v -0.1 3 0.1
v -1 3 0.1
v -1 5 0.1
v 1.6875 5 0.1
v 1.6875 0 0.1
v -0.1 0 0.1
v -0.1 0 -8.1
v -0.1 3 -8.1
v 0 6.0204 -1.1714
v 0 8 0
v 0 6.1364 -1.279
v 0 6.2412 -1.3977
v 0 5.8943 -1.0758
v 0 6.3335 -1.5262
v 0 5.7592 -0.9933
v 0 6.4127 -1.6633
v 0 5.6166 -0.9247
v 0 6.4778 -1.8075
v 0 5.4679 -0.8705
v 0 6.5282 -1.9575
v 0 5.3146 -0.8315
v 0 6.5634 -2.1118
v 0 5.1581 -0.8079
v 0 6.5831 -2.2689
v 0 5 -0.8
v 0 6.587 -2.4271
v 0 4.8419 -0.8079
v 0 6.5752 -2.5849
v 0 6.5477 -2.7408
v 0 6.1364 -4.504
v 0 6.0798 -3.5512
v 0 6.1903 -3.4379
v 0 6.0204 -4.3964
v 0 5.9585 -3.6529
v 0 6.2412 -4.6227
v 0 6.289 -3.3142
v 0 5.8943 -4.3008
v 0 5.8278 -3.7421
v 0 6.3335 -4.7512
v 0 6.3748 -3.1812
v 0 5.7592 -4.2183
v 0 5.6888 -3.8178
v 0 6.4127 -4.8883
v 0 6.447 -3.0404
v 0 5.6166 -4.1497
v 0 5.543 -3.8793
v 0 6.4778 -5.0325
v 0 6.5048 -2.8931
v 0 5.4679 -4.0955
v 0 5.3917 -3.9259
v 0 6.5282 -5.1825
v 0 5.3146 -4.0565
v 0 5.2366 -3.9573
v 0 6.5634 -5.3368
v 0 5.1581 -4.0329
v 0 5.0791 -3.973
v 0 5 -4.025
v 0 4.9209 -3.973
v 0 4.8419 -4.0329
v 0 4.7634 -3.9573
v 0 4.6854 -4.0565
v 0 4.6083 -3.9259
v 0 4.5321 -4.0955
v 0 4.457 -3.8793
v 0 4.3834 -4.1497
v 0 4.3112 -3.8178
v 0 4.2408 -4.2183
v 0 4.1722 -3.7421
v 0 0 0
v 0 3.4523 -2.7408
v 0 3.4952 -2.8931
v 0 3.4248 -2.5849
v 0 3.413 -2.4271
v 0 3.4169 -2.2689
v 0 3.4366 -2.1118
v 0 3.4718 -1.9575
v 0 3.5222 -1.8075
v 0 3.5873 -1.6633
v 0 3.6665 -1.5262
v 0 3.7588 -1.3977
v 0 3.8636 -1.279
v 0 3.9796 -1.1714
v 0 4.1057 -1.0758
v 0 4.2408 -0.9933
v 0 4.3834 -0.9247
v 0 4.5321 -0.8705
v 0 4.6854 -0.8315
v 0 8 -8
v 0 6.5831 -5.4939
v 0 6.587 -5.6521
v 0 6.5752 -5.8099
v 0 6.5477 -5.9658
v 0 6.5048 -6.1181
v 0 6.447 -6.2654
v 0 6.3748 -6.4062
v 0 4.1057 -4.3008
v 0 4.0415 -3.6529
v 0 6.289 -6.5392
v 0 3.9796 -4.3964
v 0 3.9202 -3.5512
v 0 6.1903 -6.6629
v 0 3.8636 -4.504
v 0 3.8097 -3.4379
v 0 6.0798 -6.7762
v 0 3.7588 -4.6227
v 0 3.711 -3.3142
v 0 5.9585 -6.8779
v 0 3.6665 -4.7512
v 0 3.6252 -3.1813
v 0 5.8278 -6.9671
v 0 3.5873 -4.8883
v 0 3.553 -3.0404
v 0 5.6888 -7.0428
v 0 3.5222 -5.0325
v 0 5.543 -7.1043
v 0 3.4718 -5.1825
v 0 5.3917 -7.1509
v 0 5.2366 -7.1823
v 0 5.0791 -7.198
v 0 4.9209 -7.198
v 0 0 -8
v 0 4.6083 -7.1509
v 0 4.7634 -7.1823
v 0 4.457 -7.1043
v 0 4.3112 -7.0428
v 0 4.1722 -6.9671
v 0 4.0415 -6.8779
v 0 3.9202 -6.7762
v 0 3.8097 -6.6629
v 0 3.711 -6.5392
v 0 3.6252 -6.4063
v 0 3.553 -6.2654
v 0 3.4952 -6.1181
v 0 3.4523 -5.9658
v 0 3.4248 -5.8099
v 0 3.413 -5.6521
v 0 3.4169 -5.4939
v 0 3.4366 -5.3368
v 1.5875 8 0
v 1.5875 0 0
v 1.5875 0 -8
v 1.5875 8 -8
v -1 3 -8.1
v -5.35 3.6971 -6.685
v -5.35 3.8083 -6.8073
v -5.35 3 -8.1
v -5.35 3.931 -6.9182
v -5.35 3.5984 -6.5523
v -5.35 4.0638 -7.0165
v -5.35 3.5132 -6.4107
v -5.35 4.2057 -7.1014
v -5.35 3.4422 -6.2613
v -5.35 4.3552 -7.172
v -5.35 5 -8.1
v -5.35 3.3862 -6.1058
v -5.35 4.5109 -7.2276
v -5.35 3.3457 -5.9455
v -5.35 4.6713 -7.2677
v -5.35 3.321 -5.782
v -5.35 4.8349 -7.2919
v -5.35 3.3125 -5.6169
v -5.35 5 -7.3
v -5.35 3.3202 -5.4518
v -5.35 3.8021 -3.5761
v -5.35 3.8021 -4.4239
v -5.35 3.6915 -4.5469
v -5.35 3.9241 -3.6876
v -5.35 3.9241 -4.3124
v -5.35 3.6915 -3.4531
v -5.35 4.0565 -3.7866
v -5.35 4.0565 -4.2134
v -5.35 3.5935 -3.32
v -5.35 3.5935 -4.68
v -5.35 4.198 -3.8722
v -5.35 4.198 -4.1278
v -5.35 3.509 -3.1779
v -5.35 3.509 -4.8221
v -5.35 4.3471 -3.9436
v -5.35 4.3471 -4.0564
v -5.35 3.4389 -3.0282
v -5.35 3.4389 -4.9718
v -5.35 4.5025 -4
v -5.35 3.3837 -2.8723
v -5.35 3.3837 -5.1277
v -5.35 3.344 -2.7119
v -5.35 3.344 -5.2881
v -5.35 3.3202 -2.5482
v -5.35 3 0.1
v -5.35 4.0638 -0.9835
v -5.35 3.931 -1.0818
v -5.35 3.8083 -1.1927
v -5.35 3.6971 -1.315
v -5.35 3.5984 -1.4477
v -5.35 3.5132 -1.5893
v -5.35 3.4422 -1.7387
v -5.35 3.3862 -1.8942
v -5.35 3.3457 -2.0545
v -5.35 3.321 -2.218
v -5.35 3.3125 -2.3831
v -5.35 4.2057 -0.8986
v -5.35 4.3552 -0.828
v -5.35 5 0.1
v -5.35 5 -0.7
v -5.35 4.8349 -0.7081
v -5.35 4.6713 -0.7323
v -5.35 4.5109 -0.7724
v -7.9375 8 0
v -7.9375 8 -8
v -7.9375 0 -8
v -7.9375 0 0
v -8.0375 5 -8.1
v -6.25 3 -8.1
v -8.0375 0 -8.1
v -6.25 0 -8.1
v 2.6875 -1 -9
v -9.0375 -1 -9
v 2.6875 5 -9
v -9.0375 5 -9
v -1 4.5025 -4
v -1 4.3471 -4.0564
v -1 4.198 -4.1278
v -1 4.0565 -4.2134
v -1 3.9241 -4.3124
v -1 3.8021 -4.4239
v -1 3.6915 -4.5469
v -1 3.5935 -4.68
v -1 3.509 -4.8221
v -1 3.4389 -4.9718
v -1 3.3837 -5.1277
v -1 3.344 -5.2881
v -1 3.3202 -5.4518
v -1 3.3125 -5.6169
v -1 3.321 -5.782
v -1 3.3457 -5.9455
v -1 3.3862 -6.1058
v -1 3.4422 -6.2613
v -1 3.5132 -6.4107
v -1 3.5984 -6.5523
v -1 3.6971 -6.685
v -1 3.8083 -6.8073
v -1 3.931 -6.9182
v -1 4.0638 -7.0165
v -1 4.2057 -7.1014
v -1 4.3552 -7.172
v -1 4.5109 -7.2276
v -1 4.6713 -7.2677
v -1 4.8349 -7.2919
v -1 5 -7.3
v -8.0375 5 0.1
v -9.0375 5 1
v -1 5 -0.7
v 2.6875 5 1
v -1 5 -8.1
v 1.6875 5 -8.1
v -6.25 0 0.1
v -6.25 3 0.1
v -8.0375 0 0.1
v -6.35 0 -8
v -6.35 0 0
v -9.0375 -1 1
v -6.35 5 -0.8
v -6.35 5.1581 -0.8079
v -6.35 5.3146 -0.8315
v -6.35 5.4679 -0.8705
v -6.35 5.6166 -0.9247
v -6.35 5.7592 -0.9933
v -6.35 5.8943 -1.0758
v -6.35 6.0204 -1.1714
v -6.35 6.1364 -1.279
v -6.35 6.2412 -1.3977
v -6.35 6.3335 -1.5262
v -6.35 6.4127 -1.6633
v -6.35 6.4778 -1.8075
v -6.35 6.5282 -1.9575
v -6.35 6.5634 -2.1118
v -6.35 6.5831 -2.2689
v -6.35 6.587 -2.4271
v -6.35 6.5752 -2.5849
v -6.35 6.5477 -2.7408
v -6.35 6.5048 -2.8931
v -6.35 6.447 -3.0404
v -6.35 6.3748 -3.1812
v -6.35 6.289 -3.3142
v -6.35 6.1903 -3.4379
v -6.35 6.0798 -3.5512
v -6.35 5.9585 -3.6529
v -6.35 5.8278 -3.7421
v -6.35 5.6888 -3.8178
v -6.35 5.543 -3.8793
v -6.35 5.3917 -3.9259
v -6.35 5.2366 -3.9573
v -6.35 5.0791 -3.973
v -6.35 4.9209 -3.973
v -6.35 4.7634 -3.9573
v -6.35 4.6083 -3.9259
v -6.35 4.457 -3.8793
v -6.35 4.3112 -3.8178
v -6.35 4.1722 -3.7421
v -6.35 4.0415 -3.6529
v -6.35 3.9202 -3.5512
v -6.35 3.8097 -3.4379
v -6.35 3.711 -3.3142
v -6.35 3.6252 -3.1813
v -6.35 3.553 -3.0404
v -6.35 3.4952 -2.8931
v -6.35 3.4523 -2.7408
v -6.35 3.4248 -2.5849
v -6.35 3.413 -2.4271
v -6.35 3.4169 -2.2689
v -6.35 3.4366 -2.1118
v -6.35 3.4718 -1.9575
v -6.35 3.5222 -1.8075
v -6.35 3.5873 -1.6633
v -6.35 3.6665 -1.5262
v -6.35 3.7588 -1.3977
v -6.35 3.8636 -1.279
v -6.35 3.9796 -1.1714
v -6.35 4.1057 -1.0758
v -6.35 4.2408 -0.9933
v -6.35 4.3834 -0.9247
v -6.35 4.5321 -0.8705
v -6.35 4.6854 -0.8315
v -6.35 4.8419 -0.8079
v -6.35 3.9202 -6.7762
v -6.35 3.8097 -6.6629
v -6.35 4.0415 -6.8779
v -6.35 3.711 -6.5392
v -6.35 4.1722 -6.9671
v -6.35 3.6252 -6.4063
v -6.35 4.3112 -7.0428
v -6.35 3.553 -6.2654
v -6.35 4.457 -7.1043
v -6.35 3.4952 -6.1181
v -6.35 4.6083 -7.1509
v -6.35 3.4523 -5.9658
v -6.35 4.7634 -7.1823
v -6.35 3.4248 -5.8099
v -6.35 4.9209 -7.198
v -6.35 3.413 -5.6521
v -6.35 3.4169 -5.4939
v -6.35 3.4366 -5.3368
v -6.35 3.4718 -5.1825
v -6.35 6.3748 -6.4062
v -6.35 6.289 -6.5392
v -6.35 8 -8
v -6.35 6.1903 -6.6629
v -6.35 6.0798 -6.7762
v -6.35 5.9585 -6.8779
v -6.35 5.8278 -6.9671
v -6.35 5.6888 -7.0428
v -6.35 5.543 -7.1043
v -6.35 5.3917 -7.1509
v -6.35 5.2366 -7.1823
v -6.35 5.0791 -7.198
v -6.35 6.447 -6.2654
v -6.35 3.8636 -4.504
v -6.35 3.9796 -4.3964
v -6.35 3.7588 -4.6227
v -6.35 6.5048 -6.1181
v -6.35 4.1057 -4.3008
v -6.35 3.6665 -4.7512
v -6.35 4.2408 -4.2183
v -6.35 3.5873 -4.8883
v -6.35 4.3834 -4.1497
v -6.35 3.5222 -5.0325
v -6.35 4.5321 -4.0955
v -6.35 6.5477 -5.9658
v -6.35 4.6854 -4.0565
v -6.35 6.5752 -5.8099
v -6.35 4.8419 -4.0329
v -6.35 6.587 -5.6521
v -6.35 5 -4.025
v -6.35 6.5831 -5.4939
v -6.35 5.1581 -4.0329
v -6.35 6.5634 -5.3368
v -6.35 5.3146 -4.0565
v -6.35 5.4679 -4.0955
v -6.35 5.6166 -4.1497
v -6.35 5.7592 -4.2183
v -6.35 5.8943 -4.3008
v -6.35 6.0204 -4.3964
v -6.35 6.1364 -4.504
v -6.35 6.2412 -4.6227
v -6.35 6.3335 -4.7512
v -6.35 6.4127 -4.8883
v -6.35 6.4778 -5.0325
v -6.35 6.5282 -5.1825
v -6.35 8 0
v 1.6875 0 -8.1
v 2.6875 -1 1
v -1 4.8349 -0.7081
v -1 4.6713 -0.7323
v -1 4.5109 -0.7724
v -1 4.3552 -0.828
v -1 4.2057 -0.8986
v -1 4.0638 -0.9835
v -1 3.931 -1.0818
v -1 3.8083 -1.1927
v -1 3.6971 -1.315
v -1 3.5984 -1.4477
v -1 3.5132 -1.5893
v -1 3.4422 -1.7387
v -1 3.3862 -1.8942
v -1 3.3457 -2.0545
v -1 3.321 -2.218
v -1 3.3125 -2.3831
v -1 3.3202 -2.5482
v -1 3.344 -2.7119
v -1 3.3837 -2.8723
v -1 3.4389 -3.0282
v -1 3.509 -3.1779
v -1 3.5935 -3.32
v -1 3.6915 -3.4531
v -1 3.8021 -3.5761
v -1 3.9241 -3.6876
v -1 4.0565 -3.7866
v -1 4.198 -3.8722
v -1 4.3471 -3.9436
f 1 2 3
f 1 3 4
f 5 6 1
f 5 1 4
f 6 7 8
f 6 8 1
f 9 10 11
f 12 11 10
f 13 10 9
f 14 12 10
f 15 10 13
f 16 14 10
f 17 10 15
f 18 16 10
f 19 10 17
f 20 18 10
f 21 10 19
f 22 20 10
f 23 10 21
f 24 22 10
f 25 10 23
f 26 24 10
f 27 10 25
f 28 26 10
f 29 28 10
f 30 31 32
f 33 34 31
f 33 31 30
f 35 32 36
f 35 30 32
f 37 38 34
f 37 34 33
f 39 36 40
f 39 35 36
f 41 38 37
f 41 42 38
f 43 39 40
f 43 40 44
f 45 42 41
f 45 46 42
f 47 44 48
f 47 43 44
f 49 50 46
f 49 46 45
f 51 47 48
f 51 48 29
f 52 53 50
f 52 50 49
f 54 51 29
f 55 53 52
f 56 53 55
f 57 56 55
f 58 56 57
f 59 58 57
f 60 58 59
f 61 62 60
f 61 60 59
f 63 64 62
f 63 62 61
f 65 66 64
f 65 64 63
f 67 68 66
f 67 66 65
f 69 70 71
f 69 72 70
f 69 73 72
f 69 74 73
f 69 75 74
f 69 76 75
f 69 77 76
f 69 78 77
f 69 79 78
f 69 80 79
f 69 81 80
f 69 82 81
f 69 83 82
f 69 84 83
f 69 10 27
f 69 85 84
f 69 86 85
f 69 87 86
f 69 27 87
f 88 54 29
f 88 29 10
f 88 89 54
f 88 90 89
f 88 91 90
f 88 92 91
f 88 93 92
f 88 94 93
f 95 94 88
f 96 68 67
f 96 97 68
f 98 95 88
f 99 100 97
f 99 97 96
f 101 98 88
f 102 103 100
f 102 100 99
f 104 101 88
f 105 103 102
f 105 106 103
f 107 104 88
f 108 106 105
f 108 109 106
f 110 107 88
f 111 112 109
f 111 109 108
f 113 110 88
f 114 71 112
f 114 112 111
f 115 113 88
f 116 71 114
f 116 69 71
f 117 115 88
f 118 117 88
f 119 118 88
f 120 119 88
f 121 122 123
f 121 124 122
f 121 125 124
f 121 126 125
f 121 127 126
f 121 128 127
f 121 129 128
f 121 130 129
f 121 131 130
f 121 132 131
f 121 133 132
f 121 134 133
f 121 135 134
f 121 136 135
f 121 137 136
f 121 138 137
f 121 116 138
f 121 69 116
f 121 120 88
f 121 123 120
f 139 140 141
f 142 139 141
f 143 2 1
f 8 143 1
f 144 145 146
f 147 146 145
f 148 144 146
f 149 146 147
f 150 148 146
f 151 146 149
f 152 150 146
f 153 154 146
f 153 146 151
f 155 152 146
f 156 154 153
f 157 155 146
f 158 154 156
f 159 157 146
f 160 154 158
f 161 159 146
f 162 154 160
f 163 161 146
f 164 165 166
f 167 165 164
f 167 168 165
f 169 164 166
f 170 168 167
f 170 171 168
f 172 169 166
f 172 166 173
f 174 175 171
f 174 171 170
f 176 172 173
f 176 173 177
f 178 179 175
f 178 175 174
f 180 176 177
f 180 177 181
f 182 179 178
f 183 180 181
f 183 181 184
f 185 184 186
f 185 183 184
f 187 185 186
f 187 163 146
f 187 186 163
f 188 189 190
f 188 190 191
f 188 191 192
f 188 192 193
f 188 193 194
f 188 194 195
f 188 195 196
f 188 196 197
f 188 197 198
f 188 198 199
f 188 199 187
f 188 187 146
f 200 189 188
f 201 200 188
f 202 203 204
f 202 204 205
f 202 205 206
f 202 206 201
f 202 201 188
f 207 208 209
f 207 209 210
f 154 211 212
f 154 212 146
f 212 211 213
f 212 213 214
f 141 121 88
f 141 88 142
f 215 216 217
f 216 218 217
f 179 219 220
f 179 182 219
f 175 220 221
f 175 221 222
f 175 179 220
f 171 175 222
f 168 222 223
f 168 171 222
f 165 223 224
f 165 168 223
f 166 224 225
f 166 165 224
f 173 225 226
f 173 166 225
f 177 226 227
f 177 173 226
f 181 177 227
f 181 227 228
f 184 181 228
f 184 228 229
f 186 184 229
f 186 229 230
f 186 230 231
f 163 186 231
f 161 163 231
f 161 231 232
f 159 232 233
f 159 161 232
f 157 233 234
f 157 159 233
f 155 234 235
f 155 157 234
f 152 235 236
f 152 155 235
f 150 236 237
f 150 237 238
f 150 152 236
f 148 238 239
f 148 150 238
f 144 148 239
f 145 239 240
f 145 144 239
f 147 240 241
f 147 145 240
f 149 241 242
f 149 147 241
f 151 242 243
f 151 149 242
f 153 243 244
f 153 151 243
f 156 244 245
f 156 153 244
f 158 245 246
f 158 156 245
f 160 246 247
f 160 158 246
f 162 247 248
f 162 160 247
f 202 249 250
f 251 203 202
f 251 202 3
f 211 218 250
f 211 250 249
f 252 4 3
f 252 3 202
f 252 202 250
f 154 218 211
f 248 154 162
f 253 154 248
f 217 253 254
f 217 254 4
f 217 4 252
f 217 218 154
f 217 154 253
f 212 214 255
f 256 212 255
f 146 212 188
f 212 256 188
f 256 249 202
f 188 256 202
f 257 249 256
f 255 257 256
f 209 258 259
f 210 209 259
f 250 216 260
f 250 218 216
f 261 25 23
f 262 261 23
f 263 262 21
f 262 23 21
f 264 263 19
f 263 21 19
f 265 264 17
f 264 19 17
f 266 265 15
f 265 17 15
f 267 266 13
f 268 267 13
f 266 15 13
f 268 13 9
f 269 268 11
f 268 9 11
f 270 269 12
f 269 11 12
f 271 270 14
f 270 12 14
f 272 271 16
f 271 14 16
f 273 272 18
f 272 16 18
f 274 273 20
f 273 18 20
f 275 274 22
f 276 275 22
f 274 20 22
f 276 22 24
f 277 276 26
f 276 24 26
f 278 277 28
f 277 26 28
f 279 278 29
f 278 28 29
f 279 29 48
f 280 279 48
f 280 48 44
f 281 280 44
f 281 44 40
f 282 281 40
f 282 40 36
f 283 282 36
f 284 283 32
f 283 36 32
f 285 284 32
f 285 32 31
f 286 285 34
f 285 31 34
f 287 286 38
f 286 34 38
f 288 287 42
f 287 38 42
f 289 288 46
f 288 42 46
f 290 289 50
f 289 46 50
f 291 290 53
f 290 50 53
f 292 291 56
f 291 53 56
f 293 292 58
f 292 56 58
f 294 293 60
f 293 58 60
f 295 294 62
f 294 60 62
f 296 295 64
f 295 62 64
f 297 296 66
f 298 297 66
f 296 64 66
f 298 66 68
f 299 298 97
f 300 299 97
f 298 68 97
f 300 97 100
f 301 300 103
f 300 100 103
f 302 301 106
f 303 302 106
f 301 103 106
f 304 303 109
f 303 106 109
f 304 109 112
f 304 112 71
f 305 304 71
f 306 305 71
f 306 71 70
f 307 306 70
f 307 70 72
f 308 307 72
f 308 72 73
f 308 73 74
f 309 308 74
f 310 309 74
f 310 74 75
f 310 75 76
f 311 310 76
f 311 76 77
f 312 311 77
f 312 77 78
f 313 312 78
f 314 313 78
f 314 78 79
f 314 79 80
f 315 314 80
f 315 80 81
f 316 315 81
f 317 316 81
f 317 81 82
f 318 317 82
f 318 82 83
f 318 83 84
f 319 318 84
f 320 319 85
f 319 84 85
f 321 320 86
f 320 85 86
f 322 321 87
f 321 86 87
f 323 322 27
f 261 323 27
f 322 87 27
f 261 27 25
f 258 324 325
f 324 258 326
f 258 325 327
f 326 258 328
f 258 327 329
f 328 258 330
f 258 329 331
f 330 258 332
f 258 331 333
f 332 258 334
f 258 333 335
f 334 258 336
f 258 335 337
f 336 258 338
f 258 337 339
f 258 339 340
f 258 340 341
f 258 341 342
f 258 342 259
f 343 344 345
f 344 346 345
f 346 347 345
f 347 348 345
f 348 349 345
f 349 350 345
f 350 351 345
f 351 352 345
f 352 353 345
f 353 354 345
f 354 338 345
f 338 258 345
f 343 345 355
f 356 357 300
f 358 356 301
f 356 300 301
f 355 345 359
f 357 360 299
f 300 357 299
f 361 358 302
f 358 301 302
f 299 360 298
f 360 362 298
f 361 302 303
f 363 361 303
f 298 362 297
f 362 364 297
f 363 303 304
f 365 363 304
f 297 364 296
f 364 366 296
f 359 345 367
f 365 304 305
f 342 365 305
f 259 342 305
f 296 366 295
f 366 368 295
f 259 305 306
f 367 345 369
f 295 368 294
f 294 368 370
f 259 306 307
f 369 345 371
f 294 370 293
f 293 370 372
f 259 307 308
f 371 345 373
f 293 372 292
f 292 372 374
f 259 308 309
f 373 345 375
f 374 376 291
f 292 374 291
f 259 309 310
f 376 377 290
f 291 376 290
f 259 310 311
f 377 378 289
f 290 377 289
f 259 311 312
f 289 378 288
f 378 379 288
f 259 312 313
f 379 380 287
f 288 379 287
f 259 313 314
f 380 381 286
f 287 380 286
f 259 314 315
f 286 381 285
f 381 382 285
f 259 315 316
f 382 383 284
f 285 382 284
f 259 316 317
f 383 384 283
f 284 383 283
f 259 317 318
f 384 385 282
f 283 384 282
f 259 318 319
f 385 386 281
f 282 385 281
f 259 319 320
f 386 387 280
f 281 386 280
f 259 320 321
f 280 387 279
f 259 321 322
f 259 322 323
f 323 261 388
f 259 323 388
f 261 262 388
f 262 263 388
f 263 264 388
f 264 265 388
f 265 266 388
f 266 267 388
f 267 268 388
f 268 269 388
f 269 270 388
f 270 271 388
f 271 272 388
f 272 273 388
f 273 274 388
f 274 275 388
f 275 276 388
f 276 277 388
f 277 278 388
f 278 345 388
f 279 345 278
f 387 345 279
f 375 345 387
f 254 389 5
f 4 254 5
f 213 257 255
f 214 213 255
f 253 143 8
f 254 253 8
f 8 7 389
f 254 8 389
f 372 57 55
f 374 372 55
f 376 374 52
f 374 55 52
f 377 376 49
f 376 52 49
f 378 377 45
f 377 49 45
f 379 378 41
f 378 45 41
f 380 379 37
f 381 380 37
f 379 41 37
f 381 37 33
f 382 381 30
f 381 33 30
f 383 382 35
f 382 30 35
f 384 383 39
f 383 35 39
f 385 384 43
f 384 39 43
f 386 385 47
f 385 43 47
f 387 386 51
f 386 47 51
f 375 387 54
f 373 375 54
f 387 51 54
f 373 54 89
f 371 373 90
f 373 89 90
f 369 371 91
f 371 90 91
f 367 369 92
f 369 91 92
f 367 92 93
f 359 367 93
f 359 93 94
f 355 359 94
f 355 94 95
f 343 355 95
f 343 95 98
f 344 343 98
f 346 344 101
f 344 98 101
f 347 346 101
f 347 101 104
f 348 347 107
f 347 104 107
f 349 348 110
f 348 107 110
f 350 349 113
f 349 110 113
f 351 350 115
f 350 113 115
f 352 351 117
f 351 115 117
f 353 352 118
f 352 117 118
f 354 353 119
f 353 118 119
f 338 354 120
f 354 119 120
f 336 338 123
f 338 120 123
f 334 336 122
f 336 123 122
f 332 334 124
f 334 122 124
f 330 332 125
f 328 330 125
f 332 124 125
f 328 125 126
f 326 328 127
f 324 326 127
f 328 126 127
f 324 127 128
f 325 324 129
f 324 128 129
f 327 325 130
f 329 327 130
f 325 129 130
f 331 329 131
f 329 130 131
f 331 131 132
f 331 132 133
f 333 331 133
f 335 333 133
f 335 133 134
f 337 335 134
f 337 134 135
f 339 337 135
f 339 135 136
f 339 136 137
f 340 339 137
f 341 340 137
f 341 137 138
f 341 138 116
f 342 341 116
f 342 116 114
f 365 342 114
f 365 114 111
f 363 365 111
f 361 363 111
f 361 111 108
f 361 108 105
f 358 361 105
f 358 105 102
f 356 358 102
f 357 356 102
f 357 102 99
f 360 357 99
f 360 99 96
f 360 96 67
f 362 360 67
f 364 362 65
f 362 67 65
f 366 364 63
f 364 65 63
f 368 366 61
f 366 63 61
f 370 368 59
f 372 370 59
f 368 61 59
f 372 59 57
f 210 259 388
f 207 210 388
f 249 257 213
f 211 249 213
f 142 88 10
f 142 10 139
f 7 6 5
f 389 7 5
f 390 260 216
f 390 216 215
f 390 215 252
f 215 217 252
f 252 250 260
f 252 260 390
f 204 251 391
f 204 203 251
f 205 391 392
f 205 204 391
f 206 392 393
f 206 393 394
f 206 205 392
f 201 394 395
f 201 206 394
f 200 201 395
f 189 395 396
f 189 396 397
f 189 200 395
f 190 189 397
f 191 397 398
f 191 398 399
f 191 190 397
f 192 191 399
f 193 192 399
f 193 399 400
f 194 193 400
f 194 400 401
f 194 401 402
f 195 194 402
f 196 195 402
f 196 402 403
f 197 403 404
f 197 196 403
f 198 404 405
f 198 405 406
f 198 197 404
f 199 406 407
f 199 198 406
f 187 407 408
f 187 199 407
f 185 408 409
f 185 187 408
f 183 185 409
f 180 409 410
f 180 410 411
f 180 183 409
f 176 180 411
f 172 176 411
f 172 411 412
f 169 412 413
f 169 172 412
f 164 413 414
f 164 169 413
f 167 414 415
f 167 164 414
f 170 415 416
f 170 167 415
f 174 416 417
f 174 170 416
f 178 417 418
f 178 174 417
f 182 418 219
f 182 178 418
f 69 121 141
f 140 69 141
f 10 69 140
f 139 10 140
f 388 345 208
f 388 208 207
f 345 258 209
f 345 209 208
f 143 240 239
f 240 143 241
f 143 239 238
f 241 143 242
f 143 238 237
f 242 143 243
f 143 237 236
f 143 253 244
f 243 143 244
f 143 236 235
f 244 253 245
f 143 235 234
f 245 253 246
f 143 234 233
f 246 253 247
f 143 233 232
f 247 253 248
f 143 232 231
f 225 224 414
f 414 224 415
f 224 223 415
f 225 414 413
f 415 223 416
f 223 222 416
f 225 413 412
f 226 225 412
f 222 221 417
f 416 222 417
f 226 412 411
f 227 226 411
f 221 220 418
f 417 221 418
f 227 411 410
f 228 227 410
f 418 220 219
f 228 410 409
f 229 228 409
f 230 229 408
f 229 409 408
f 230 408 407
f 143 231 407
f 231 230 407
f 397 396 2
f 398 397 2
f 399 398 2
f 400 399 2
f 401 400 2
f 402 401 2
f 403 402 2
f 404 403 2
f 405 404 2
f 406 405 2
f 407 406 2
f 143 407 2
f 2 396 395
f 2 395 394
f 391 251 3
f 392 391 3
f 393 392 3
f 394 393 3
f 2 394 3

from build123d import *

# Parameters (mm, degrees)
SKETCH2_W                = 1.5875
SKETCH2_H                = 8
BOSS_EXTRUDE1_DEPTH      = 8
SKETCH3_R                = 1.5875
BOSS_EXTRUDE2_DEPTH      = 6.35
SKETCH4_W                = 8
SKETCH4_H                = 8
BOSS_EXTRUDE3_DEPTH      = 1.5875
BOSS_EXTRUDE4_DEPTH      = 2.175
BOSS_EXTRUDE4_DEPTH_BACK = 2.175
SKETCH6_W                = 11.725
SKETCH6_H                = 10
SKETCH6_W_2              = 1.7875
SKETCH6_H_2              = 8.2
BOSS_EXTRUDE5_DEPTH      = 3
SKETCH8_W                = 11.725
SKETCH8_H                = 10
SKETCH8_W_2              = 9.725
SKETCH8_H_2              = 8.2
BOSS_EXTRUDE6_DEPTH      = 2
SKETCH9_W                = 11.725
SKETCH9_H                = 10
BOSS_EXTRUDE7_DEPTH      = 1


with BuildPart() as part:
    # Sketch2 → Boss-Extrude1 (new body)
    with BuildSketch(Plane(origin=(0, 0, 0), x_dir=(1, 0, 0), z_dir=(0, 1, 0))):
        with Locations((0.79375, 4)):
            Rectangle(SKETCH2_W, SKETCH2_H)
    extrude(amount=BOSS_EXTRUDE1_DEPTH)

    # Sketch3 → Boss-Extrude2 (add)
    with BuildSketch(Plane.ZY):
        with Locations((-5.6125, 5)):
            Circle(SKETCH3_R)
        with Locations((-2.3875, 5)):
            Circle(SKETCH3_R)
    extrude(amount=BOSS_EXTRUDE2_DEPTH)

    # Sketch4 → Boss-Extrude3 (add)
    with BuildSketch(Plane.ZY.offset(6.35)):
        with Locations((-4, 4)):
            Rectangle(SKETCH4_W, SKETCH4_H)
    extrude(amount=BOSS_EXTRUDE3_DEPTH)


with BuildPart() as body_2:
    # Sketch5 → Boss-Extrude4 (new body, two sides)
    with BuildSketch(Plane.ZY.offset(3.175)) as boss_extrude4_sk:
        with BuildLine():
            Line((-7.3, 5), (-9, 5))
            Line((-9, 5), (-9, 0))
            Line((-9, 0), (1, 0))
            Line((1, 0), (1, 5))
            Line((1, 5), (-0.7, 5))
            ThreePointArc((-0.7, 5), (-2.135942353, 3.33135534), (-4, 4.502506281))
            ThreePointArc((-4, 4.502506281), (-5.864057647, 3.33135534), (-7.3, 5))
        make_face()
    extrude(amount=BOSS_EXTRUDE4_DEPTH)
    extrude(boss_extrude4_sk.sketch, amount=-BOSS_EXTRUDE4_DEPTH_BACK)

    # Sketch6 → Boss-Extrude5 (add)
    with BuildSketch(Plane.XZ):
        with Locations((-3.175, -4)):
            Rectangle(SKETCH6_W, SKETCH6_H)
        with Locations((0.79375, -4)):
            Rectangle(SKETCH6_W_2, SKETCH6_H_2, mode=Mode.SUBTRACT)
        with Locations((-7.14375, -4)):
            Rectangle(SKETCH6_W_2, SKETCH6_H_2, mode=Mode.SUBTRACT)
    extrude(amount=-BOSS_EXTRUDE5_DEPTH)

    # Sketch8 → Boss-Extrude6 (add)
    with BuildSketch(Plane(origin=(0, 3, 0), x_dir=(1, 0, 0), z_dir=(0, 1, 0))):
        with Locations((-3.175, 4)):
            Rectangle(SKETCH8_W, SKETCH8_H)
        with Locations((-3.175, 4)):
            Rectangle(SKETCH8_W_2, SKETCH8_H_2, mode=Mode.SUBTRACT)
    extrude(amount=BOSS_EXTRUDE6_DEPTH)


with BuildPart() as body_3:
    # Sketch9 → Boss-Extrude7 (new body)
    with BuildSketch(Plane.XZ):
        with Locations((-3.175, -4)):
            Rectangle(SKETCH9_W, SKETCH9_H)
    extrude(amount=BOSS_EXTRUDE7_DEPTH)


with BuildPart() as body_2_1:
    add(body_2.part)

    # Combine1: union body 3
    add(body_3.part)


solid = Compound([part.part, body_2_1.part])
